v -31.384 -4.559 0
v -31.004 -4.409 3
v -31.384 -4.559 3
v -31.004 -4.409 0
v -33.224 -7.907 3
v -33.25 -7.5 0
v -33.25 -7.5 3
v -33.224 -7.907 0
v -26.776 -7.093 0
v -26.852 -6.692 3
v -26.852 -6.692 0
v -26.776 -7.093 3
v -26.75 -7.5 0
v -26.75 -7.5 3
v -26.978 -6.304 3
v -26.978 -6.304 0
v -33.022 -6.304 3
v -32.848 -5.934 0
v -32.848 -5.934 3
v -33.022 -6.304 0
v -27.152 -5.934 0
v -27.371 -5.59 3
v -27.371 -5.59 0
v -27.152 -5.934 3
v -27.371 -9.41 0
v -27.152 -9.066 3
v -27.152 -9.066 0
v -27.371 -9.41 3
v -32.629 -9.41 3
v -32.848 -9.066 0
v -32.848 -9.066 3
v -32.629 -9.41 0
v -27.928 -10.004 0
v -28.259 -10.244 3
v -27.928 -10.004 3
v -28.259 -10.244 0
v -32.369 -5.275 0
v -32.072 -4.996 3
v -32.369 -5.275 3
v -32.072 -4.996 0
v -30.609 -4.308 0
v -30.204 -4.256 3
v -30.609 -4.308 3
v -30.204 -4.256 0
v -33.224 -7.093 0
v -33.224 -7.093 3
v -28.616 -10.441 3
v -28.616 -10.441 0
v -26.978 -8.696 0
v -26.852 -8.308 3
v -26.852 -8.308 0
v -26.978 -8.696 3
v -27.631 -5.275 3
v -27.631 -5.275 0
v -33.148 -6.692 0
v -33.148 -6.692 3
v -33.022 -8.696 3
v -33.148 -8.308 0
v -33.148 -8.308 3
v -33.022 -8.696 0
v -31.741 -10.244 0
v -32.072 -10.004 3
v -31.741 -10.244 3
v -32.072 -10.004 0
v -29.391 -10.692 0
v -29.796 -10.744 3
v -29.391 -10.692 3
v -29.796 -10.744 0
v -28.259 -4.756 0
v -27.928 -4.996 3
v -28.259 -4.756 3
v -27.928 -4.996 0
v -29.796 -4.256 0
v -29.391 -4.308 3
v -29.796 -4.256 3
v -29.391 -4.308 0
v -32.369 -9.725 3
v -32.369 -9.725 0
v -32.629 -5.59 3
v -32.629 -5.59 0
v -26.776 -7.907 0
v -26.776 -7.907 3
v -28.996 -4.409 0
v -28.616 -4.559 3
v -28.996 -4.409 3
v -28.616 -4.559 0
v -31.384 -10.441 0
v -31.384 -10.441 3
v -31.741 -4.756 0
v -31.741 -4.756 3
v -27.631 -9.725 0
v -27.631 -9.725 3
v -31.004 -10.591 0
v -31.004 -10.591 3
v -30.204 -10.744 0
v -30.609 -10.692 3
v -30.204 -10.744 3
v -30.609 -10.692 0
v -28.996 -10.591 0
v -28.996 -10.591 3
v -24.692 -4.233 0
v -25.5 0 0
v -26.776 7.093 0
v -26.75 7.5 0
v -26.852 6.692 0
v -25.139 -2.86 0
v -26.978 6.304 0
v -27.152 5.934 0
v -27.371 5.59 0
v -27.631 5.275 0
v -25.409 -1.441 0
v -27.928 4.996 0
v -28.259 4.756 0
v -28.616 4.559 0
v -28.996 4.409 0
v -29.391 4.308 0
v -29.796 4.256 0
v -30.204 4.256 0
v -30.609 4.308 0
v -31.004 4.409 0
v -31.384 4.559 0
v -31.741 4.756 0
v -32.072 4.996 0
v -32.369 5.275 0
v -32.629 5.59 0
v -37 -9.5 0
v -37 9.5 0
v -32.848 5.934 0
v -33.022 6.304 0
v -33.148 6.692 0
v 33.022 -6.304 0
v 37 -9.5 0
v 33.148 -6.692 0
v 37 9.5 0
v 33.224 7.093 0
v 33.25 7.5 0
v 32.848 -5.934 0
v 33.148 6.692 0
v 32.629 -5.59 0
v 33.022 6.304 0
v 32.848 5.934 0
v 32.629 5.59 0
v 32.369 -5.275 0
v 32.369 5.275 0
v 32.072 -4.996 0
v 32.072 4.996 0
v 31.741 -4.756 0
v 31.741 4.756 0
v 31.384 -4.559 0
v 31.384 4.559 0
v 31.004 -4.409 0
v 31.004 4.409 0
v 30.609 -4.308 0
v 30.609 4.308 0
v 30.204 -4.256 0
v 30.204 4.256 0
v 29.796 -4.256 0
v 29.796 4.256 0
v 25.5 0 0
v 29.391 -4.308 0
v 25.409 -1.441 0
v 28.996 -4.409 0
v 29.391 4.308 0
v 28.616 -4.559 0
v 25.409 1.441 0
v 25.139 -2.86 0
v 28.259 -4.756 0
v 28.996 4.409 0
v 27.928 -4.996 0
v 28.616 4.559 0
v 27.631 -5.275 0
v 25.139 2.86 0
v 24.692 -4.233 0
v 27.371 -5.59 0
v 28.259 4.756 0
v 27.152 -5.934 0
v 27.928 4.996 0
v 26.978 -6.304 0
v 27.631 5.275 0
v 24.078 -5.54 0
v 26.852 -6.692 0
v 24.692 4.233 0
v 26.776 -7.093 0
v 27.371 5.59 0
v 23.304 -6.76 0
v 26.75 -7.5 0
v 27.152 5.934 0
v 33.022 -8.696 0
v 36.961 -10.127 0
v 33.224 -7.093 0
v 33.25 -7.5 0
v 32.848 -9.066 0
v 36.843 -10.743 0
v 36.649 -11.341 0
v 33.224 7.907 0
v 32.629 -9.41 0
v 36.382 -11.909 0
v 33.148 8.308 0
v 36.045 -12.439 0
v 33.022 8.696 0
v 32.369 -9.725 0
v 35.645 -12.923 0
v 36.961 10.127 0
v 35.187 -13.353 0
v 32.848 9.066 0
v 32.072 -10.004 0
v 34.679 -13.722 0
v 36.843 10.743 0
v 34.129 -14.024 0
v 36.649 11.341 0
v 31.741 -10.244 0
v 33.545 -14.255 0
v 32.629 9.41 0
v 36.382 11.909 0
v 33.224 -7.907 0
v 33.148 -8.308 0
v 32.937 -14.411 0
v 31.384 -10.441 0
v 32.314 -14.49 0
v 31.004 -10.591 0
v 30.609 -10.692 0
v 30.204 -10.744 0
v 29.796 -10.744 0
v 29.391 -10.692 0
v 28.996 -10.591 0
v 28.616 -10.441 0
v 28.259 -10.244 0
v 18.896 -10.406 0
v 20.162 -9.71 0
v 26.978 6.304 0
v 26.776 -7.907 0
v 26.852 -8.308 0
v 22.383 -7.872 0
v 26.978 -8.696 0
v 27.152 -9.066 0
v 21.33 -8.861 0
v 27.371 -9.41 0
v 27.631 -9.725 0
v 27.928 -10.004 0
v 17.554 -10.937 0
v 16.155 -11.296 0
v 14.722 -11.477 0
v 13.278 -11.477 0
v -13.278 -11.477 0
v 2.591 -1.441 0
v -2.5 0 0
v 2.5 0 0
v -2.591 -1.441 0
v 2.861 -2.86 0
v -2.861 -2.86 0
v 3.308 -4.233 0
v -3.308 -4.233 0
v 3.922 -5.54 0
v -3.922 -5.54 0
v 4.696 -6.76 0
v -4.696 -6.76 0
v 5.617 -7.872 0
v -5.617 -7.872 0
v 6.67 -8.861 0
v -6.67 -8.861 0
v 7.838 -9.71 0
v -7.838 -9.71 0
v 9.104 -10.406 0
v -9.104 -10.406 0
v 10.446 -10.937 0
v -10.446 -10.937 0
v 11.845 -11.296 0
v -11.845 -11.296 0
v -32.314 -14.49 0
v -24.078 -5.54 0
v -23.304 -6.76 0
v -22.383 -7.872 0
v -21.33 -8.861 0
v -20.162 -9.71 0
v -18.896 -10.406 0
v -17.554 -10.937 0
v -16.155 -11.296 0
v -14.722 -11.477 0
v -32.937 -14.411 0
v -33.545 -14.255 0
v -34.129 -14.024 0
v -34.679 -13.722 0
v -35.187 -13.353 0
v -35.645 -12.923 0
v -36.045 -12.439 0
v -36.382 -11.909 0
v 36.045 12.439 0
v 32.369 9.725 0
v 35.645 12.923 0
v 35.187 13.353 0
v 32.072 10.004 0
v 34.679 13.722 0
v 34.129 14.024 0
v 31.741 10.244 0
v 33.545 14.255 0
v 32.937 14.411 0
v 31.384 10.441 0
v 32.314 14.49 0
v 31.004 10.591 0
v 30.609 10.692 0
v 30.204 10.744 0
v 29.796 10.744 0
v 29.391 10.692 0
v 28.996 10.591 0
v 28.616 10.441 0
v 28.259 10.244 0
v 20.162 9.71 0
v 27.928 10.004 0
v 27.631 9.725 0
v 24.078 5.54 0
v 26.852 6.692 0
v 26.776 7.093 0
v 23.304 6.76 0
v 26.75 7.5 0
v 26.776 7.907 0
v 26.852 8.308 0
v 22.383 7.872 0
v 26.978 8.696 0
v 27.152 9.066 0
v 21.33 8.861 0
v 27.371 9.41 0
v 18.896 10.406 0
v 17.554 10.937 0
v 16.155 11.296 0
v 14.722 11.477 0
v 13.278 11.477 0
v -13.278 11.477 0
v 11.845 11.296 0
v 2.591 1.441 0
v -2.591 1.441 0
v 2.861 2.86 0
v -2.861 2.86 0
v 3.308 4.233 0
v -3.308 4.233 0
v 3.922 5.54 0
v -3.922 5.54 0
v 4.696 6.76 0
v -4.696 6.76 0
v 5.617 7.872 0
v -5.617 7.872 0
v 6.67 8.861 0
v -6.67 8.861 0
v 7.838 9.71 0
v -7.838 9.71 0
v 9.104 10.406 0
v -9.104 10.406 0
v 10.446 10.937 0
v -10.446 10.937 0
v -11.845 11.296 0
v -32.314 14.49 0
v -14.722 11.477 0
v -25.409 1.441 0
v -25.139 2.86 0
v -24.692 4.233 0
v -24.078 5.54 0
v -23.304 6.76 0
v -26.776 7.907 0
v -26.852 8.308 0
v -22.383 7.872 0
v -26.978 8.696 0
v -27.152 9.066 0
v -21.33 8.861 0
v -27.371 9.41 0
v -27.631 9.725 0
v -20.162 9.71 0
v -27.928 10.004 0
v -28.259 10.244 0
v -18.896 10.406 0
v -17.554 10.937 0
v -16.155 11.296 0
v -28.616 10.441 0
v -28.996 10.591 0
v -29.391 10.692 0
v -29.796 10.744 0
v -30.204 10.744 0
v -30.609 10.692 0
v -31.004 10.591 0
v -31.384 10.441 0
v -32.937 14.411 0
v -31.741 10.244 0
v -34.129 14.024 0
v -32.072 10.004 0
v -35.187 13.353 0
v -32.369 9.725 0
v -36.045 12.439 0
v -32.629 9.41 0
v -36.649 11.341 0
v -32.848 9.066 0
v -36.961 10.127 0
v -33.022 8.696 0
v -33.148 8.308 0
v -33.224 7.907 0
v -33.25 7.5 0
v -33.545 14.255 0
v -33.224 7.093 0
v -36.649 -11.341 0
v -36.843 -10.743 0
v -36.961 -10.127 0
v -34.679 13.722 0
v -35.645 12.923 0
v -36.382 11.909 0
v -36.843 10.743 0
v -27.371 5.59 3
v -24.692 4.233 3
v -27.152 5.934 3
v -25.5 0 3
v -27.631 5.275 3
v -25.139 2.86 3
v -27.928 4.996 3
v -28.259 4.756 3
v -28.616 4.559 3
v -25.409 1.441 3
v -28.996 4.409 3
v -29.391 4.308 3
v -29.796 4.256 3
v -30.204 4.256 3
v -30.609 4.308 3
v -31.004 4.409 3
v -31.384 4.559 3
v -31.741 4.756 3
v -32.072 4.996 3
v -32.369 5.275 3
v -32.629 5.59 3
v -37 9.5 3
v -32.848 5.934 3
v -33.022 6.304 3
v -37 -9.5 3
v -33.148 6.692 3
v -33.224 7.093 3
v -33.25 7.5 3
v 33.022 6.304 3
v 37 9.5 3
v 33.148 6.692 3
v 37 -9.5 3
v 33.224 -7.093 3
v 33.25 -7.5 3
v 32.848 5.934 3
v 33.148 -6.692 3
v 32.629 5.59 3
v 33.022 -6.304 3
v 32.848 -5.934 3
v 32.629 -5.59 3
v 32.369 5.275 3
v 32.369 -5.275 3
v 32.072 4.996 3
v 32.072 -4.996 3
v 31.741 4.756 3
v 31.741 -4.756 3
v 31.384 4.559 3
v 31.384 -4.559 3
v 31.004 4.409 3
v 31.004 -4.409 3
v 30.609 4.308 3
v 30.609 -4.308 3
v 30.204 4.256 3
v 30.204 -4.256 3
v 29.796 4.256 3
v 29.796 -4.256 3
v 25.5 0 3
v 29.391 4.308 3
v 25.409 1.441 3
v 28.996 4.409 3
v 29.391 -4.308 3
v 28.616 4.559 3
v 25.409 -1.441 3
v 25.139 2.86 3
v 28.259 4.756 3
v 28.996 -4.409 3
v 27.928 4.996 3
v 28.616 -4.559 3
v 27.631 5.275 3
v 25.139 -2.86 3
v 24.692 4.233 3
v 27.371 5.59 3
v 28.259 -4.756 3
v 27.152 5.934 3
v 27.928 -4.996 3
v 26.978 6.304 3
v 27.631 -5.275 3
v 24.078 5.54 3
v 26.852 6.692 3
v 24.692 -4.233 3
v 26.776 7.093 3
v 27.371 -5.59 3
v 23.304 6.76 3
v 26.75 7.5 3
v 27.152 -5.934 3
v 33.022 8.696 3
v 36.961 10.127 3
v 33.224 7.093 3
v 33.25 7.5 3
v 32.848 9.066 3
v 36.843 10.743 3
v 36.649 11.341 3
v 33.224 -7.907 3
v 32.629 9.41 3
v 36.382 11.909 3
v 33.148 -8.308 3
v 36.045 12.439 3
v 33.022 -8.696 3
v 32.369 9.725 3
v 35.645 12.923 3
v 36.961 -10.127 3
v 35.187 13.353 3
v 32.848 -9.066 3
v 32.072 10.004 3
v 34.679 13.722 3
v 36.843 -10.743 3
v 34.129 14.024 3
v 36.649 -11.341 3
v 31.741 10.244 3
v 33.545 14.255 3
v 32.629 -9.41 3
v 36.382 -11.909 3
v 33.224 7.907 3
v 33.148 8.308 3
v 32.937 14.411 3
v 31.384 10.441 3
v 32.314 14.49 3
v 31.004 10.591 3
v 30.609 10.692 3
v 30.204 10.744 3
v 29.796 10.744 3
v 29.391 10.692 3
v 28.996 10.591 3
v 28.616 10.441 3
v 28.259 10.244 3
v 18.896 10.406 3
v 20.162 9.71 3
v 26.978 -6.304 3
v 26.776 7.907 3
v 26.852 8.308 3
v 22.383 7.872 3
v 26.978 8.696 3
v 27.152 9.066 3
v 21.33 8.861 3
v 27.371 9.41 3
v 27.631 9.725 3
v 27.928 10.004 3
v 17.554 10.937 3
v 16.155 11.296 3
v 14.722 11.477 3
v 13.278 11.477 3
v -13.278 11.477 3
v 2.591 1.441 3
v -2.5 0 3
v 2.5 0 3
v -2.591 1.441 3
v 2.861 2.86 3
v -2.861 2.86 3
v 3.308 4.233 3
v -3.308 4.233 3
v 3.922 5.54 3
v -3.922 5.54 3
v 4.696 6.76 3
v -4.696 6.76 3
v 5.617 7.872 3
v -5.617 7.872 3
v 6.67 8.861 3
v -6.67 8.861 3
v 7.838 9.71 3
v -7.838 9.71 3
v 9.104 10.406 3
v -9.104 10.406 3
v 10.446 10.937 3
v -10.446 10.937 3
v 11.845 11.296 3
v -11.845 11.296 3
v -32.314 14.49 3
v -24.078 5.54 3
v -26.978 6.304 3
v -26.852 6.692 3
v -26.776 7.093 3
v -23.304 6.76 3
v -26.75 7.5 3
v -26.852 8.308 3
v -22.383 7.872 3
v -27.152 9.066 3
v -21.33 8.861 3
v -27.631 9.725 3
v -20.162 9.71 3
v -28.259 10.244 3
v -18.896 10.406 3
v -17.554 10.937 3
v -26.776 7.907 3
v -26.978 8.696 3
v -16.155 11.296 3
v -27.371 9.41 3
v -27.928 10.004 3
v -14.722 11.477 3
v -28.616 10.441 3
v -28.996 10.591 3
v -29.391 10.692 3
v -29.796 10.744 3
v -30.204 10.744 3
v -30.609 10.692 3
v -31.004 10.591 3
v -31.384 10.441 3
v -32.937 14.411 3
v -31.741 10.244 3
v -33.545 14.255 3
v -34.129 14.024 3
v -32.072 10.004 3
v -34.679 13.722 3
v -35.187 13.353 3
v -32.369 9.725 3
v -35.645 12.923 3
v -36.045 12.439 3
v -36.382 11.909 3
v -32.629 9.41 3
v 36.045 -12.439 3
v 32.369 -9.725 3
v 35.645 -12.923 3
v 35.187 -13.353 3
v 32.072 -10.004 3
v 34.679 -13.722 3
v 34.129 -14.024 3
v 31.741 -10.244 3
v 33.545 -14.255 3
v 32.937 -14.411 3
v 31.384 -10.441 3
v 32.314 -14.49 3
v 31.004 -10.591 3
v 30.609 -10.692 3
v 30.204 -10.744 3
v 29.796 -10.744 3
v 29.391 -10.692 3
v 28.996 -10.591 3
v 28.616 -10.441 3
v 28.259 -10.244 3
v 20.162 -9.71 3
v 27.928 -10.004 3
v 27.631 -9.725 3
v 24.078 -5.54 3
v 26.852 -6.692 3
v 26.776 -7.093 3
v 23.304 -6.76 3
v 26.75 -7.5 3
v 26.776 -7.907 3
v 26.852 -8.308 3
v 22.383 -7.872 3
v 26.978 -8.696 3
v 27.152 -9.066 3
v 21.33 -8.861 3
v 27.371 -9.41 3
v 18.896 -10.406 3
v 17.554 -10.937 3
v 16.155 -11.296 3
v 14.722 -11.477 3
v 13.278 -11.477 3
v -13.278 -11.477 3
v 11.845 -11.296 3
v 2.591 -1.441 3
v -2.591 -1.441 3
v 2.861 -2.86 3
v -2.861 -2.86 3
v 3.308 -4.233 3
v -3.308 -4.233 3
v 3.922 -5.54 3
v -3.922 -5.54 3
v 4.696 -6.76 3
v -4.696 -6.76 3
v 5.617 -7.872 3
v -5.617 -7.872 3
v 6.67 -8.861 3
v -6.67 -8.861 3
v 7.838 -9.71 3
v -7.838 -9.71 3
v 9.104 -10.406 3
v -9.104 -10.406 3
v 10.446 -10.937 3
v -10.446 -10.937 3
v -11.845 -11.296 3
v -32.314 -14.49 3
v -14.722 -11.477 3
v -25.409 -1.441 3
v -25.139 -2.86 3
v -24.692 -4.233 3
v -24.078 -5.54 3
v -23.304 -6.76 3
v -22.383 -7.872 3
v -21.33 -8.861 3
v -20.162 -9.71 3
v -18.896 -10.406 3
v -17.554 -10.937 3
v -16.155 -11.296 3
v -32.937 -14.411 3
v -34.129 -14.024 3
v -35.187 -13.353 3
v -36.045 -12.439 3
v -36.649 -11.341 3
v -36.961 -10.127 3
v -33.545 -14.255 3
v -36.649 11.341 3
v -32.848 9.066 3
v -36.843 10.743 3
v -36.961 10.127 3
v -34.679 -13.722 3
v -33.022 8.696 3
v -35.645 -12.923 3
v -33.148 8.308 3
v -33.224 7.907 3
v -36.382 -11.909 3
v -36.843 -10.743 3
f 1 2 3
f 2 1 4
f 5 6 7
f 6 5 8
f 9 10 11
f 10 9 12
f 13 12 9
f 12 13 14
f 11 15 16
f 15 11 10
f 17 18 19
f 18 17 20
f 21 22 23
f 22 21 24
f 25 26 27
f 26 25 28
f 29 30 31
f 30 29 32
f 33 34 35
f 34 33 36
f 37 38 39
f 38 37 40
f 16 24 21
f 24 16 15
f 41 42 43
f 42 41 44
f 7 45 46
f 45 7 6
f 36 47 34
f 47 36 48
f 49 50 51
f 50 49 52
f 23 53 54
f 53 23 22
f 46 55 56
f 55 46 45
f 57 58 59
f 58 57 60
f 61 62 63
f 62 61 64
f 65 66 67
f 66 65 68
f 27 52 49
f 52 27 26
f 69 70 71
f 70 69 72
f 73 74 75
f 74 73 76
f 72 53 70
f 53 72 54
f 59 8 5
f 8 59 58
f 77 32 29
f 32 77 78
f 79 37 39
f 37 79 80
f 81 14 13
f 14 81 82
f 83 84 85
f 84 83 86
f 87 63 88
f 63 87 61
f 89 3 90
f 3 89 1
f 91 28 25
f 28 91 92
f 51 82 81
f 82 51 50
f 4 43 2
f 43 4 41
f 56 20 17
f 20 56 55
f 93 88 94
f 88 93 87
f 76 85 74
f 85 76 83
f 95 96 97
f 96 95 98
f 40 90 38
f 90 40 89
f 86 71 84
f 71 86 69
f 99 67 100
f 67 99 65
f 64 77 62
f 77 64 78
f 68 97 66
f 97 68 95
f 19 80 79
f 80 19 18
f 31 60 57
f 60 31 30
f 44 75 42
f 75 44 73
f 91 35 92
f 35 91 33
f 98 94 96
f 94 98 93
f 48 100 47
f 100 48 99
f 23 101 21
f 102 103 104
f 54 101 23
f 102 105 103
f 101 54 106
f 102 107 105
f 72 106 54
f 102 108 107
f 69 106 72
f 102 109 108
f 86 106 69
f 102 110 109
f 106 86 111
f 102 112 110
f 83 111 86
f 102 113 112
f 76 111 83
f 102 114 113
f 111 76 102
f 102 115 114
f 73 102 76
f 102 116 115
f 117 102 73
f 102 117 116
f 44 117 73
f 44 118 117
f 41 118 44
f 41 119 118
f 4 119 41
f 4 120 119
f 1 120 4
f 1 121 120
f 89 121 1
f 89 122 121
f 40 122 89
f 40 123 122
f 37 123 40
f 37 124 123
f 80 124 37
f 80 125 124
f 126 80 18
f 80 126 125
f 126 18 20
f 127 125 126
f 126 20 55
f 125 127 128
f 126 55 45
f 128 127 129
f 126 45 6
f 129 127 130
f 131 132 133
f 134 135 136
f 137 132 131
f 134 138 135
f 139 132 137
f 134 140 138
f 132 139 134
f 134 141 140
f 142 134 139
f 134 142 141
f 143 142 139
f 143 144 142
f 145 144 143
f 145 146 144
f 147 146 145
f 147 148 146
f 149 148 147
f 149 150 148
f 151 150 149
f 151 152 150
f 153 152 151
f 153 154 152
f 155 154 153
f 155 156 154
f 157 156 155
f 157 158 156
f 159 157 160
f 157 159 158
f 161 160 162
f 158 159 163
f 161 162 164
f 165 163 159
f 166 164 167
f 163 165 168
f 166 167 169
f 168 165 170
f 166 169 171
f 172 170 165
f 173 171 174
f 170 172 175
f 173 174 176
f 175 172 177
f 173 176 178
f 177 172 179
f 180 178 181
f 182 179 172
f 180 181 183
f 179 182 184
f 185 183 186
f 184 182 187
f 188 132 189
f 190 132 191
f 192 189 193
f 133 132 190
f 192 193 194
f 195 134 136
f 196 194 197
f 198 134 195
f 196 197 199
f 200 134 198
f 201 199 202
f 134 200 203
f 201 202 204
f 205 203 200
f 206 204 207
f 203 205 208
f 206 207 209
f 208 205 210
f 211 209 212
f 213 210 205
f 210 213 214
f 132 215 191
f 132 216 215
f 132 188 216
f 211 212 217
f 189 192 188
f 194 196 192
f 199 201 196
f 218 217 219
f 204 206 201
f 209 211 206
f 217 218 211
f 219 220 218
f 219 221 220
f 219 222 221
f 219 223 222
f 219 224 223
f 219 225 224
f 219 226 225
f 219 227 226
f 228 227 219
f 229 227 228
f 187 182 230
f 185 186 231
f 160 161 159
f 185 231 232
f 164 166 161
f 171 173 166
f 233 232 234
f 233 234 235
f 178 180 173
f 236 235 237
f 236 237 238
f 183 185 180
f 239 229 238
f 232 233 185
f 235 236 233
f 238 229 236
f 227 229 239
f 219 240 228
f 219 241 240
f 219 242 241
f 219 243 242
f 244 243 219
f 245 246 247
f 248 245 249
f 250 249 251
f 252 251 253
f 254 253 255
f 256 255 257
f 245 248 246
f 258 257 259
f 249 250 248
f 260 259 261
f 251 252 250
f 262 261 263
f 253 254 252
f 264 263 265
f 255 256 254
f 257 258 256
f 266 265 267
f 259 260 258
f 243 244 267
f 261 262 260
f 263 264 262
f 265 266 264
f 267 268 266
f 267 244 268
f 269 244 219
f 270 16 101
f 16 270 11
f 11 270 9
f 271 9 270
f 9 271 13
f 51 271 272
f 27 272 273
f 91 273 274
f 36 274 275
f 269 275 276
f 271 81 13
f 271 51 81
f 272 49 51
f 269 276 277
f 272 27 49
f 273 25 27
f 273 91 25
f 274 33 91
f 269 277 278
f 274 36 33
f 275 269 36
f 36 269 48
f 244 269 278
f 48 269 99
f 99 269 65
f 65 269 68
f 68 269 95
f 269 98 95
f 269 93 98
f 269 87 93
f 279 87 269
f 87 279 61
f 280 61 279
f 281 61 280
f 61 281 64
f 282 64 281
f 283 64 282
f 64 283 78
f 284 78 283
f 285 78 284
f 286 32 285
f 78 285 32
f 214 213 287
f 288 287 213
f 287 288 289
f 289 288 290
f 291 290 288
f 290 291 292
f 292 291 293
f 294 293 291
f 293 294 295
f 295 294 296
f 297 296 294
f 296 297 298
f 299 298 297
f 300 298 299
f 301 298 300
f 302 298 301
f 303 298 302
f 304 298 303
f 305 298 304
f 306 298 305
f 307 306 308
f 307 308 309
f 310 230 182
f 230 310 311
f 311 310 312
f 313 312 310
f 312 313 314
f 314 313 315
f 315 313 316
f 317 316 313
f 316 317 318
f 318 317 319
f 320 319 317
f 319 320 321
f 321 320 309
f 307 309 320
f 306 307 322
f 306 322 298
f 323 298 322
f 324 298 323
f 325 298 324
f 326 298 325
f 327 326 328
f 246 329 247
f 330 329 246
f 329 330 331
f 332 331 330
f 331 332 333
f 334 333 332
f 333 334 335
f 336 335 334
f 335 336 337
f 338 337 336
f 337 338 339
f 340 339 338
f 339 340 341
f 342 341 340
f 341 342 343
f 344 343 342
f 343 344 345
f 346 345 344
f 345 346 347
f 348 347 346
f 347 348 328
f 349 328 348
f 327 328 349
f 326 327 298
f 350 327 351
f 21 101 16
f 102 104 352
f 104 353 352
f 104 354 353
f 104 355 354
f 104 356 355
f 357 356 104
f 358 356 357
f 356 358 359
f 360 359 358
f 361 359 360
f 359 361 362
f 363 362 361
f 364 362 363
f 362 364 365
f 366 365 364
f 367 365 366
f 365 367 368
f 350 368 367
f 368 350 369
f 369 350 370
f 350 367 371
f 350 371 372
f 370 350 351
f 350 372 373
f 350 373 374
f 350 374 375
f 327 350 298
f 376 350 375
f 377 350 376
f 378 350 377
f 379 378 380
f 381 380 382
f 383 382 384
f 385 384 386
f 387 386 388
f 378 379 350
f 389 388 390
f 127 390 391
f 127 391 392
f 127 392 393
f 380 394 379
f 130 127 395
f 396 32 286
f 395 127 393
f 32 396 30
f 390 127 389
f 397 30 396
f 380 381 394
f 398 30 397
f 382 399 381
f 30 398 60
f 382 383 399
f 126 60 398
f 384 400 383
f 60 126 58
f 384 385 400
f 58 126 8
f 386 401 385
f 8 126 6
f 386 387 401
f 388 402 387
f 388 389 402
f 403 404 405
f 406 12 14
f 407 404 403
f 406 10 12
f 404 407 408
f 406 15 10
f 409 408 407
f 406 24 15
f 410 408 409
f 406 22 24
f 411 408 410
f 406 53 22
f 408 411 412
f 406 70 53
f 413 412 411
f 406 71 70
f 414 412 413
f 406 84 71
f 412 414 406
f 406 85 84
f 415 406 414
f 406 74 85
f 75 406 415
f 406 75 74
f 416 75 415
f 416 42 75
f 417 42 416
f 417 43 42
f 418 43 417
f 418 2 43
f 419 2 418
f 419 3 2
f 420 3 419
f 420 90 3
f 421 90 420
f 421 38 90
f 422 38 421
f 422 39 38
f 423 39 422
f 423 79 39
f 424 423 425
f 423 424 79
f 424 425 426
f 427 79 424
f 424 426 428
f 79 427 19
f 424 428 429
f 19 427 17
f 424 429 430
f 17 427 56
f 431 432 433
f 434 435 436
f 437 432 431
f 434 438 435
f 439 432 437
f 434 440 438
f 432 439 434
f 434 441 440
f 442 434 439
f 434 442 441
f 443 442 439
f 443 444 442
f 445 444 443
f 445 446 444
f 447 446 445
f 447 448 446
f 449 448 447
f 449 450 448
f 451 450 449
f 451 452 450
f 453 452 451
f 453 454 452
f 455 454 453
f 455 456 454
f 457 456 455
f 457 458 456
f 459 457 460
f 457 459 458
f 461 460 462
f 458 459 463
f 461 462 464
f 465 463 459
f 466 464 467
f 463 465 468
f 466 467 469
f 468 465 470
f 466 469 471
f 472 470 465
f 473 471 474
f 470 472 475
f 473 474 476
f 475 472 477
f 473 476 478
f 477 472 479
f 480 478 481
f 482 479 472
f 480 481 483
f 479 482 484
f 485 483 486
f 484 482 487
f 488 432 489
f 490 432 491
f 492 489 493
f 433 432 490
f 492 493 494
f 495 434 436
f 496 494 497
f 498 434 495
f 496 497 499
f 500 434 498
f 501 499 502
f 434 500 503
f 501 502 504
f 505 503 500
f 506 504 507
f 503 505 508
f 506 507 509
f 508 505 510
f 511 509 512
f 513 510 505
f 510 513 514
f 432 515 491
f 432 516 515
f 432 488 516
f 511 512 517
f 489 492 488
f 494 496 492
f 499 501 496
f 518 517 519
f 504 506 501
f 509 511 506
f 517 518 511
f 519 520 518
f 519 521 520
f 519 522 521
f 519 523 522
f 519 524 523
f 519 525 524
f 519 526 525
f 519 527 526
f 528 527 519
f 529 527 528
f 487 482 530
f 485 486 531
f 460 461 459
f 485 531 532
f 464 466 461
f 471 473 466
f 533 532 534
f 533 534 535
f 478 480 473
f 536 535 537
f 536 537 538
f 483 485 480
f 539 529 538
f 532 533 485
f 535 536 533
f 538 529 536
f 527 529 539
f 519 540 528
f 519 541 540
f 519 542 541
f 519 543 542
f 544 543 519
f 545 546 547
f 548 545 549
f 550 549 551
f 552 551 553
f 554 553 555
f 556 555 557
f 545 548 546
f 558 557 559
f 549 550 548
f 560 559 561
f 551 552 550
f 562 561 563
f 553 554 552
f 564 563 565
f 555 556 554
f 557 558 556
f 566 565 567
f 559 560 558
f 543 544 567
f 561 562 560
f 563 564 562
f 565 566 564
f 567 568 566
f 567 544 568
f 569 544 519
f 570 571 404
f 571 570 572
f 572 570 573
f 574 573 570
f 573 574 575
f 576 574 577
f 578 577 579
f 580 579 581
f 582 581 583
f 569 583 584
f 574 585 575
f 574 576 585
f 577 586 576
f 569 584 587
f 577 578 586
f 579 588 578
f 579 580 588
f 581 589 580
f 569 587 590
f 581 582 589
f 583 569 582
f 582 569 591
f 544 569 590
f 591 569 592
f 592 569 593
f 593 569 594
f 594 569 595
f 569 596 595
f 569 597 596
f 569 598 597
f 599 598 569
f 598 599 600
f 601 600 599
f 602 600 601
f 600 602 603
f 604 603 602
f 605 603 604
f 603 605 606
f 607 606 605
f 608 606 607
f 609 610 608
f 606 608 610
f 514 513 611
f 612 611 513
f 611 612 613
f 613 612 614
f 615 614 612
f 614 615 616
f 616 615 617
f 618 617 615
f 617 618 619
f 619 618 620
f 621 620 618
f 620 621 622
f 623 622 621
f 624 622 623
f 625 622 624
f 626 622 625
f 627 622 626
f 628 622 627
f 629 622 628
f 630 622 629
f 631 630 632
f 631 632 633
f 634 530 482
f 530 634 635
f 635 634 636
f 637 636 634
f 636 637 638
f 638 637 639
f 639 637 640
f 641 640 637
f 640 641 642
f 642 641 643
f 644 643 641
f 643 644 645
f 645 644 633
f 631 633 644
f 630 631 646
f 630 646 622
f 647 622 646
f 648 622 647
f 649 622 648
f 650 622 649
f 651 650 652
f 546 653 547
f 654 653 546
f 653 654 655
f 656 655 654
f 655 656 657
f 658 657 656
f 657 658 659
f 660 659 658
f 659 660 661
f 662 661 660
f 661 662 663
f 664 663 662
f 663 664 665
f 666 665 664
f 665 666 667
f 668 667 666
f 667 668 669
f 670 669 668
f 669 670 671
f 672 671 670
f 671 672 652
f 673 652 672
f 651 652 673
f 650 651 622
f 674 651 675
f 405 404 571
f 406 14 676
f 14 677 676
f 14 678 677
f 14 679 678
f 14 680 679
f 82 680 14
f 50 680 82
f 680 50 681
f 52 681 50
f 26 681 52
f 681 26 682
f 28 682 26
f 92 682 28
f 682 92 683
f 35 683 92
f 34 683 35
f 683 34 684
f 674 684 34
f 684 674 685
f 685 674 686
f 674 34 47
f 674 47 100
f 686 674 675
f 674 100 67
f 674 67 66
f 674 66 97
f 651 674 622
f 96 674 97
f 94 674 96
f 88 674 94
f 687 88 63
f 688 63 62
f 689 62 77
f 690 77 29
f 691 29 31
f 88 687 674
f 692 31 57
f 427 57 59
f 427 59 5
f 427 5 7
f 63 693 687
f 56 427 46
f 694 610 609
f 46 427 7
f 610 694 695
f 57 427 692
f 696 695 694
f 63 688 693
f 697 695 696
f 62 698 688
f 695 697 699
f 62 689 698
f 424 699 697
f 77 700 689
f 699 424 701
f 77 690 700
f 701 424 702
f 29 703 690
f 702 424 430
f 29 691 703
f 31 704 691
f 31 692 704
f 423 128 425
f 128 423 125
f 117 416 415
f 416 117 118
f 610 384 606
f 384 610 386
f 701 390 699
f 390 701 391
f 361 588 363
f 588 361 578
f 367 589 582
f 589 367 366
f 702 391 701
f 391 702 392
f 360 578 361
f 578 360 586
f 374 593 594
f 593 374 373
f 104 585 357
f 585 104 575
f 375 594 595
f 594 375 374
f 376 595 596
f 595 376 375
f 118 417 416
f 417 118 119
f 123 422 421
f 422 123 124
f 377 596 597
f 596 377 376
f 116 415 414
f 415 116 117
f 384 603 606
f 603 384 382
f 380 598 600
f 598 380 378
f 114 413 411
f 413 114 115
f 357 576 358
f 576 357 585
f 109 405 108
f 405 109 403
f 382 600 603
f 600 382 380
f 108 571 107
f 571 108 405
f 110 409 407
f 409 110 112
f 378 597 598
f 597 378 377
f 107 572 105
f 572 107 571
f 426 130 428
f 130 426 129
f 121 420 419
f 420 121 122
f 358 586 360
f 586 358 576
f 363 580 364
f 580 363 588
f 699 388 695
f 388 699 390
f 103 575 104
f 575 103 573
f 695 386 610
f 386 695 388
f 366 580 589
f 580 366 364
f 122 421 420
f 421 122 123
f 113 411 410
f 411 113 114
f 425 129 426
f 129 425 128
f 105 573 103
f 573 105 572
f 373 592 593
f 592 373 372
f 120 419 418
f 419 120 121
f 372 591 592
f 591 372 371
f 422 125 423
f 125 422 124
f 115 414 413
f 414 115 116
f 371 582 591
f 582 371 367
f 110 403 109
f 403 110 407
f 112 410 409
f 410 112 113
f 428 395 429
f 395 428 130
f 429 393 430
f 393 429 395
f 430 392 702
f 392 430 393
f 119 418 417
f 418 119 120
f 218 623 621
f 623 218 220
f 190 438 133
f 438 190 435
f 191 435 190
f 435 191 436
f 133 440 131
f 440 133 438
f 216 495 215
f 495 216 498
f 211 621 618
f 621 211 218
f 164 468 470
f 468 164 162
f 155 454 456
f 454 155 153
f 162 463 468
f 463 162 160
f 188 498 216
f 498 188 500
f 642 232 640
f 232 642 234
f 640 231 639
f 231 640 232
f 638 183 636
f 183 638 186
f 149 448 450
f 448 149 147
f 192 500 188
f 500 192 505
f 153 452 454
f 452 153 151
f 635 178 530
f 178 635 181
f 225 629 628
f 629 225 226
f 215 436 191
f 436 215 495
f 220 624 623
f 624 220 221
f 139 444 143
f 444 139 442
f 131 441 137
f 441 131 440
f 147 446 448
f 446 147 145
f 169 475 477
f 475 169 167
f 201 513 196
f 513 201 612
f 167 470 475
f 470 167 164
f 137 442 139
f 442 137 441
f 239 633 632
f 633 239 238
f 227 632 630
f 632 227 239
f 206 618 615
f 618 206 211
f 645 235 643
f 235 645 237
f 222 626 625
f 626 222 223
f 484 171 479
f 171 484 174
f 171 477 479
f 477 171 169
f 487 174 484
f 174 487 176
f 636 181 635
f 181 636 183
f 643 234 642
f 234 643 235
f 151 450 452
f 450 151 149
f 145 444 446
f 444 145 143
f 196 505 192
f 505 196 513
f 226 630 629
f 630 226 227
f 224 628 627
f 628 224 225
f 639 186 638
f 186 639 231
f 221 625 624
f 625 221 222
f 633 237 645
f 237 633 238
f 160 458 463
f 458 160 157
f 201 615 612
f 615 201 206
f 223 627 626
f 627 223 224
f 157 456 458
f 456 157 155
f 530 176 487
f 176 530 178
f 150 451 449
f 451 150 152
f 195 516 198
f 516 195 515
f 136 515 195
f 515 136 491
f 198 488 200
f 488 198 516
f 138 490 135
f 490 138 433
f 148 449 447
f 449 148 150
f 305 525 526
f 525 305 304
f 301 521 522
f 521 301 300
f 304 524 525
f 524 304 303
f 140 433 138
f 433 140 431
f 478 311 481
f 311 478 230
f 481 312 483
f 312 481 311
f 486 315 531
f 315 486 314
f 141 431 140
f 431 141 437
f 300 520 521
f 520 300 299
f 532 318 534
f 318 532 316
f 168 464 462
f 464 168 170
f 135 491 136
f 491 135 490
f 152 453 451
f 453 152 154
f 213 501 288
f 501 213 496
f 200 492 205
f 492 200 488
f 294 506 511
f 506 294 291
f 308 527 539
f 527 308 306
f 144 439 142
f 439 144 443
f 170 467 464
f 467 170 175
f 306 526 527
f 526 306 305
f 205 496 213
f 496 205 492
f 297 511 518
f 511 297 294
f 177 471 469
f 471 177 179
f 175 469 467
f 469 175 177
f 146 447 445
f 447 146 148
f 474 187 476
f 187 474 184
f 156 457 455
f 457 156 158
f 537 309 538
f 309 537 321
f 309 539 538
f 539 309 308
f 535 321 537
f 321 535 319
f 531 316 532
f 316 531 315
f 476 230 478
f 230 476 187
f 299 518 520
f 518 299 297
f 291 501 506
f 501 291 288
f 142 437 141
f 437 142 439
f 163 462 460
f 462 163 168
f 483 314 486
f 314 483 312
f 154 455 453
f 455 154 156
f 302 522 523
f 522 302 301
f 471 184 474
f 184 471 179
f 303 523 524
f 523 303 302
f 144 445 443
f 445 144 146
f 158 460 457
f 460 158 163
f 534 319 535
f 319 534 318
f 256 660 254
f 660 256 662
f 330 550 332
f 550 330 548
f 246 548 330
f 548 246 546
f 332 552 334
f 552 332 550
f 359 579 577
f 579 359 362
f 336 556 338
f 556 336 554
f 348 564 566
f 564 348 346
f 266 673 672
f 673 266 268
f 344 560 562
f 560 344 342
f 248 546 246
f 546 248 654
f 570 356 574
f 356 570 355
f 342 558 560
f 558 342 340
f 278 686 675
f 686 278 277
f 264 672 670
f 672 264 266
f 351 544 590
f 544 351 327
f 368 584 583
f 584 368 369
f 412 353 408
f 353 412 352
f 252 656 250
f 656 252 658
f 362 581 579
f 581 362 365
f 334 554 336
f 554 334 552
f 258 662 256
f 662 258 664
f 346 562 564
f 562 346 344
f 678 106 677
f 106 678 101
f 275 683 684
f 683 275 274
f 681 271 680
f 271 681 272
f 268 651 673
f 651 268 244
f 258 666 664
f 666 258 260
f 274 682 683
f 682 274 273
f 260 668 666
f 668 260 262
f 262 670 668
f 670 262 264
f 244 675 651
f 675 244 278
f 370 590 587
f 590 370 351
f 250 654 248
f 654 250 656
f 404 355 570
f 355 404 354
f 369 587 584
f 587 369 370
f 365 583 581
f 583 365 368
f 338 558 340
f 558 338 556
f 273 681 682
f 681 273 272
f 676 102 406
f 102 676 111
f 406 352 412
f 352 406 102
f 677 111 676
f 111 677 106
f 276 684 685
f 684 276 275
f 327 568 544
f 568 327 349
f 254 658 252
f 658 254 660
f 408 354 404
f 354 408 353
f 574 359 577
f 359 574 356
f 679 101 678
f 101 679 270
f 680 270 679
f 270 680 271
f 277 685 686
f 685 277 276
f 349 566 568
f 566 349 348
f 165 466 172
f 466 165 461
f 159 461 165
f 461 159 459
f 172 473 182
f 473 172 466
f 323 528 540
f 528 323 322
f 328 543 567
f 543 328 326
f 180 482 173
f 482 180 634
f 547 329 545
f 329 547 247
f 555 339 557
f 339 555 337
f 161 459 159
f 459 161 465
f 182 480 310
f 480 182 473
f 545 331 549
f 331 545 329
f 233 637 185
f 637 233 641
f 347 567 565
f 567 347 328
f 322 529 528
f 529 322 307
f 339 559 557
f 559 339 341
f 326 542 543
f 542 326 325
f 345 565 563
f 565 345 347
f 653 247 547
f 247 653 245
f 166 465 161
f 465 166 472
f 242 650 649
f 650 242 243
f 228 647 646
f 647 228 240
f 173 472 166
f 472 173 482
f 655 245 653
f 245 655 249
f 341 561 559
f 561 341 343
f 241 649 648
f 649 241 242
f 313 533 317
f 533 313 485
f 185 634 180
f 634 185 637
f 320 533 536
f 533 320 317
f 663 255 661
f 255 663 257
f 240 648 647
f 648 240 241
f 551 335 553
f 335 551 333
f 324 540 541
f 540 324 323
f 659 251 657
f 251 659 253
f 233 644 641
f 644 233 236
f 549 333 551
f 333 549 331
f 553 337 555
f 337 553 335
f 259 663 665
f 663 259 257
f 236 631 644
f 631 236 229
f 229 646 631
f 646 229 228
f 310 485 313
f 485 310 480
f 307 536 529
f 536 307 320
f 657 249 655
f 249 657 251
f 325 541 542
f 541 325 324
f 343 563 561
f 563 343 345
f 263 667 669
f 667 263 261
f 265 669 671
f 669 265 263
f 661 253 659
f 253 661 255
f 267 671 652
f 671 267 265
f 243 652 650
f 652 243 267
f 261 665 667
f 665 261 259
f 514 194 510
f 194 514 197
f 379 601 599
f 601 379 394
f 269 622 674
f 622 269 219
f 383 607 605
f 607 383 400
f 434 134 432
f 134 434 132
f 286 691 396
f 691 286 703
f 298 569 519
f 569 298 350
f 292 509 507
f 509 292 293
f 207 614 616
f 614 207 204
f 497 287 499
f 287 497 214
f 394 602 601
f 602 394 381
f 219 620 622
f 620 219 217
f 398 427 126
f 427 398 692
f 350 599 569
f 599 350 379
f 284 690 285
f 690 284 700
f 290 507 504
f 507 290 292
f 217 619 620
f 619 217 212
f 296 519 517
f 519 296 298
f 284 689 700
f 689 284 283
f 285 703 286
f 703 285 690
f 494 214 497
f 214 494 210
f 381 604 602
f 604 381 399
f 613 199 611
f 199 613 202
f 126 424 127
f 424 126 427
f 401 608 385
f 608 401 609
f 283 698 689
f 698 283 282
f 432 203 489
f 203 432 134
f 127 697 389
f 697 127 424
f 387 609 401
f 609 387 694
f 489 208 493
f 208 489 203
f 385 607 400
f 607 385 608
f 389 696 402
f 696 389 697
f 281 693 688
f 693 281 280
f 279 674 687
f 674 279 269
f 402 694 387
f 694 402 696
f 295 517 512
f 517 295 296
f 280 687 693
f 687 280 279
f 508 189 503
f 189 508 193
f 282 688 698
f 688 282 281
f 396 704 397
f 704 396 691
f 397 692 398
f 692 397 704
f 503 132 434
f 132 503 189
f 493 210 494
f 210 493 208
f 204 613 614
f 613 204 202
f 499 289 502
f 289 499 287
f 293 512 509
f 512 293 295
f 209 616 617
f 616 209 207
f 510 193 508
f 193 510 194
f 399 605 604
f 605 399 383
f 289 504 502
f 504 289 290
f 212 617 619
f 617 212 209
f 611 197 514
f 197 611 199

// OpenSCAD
$fn = 50;

difference() {
	union() {
		hull() {
			translate(v = [-32.0, 9.5, 0]) {
				cylinder(h = 3, r = 5);
			}
			translate(v = [32.0, 9.5, 0]) {
				cylinder(h = 3, r = 5);
			}
			translate(v = [-32.0, -9.5, 0]) {
				cylinder(h = 3, r = 5);
			}
			translate(v = [32.0, -9.5, 0]) {
				cylinder(h = 3, r = 5);
			}
		}
	}
	union() {
		translate(v = [-30.0, -7.5, 0]) {
			cylinder(h = 3, r = 3.25);
		}
		translate(v = [-30.0, 7.5, 0]) {
			cylinder(h = 3, r = 3.25);
		}
		translate(v = [30.0, -7.5, 0]) {
			cylinder(h = 3, r = 3.25);
		}
		translate(v = [30.0, 7.5, 0]) {
			cylinder(h = 3, r = 3.25);
		}
		translate(v = [-14.0, 0, 0.0]) {
			cylinder(h = 3, r = 11.5);
		}
		translate(v = [14.0, 0, 0.0]) {
			cylinder(h = 3, r = 11.5);
		}
	}
}
